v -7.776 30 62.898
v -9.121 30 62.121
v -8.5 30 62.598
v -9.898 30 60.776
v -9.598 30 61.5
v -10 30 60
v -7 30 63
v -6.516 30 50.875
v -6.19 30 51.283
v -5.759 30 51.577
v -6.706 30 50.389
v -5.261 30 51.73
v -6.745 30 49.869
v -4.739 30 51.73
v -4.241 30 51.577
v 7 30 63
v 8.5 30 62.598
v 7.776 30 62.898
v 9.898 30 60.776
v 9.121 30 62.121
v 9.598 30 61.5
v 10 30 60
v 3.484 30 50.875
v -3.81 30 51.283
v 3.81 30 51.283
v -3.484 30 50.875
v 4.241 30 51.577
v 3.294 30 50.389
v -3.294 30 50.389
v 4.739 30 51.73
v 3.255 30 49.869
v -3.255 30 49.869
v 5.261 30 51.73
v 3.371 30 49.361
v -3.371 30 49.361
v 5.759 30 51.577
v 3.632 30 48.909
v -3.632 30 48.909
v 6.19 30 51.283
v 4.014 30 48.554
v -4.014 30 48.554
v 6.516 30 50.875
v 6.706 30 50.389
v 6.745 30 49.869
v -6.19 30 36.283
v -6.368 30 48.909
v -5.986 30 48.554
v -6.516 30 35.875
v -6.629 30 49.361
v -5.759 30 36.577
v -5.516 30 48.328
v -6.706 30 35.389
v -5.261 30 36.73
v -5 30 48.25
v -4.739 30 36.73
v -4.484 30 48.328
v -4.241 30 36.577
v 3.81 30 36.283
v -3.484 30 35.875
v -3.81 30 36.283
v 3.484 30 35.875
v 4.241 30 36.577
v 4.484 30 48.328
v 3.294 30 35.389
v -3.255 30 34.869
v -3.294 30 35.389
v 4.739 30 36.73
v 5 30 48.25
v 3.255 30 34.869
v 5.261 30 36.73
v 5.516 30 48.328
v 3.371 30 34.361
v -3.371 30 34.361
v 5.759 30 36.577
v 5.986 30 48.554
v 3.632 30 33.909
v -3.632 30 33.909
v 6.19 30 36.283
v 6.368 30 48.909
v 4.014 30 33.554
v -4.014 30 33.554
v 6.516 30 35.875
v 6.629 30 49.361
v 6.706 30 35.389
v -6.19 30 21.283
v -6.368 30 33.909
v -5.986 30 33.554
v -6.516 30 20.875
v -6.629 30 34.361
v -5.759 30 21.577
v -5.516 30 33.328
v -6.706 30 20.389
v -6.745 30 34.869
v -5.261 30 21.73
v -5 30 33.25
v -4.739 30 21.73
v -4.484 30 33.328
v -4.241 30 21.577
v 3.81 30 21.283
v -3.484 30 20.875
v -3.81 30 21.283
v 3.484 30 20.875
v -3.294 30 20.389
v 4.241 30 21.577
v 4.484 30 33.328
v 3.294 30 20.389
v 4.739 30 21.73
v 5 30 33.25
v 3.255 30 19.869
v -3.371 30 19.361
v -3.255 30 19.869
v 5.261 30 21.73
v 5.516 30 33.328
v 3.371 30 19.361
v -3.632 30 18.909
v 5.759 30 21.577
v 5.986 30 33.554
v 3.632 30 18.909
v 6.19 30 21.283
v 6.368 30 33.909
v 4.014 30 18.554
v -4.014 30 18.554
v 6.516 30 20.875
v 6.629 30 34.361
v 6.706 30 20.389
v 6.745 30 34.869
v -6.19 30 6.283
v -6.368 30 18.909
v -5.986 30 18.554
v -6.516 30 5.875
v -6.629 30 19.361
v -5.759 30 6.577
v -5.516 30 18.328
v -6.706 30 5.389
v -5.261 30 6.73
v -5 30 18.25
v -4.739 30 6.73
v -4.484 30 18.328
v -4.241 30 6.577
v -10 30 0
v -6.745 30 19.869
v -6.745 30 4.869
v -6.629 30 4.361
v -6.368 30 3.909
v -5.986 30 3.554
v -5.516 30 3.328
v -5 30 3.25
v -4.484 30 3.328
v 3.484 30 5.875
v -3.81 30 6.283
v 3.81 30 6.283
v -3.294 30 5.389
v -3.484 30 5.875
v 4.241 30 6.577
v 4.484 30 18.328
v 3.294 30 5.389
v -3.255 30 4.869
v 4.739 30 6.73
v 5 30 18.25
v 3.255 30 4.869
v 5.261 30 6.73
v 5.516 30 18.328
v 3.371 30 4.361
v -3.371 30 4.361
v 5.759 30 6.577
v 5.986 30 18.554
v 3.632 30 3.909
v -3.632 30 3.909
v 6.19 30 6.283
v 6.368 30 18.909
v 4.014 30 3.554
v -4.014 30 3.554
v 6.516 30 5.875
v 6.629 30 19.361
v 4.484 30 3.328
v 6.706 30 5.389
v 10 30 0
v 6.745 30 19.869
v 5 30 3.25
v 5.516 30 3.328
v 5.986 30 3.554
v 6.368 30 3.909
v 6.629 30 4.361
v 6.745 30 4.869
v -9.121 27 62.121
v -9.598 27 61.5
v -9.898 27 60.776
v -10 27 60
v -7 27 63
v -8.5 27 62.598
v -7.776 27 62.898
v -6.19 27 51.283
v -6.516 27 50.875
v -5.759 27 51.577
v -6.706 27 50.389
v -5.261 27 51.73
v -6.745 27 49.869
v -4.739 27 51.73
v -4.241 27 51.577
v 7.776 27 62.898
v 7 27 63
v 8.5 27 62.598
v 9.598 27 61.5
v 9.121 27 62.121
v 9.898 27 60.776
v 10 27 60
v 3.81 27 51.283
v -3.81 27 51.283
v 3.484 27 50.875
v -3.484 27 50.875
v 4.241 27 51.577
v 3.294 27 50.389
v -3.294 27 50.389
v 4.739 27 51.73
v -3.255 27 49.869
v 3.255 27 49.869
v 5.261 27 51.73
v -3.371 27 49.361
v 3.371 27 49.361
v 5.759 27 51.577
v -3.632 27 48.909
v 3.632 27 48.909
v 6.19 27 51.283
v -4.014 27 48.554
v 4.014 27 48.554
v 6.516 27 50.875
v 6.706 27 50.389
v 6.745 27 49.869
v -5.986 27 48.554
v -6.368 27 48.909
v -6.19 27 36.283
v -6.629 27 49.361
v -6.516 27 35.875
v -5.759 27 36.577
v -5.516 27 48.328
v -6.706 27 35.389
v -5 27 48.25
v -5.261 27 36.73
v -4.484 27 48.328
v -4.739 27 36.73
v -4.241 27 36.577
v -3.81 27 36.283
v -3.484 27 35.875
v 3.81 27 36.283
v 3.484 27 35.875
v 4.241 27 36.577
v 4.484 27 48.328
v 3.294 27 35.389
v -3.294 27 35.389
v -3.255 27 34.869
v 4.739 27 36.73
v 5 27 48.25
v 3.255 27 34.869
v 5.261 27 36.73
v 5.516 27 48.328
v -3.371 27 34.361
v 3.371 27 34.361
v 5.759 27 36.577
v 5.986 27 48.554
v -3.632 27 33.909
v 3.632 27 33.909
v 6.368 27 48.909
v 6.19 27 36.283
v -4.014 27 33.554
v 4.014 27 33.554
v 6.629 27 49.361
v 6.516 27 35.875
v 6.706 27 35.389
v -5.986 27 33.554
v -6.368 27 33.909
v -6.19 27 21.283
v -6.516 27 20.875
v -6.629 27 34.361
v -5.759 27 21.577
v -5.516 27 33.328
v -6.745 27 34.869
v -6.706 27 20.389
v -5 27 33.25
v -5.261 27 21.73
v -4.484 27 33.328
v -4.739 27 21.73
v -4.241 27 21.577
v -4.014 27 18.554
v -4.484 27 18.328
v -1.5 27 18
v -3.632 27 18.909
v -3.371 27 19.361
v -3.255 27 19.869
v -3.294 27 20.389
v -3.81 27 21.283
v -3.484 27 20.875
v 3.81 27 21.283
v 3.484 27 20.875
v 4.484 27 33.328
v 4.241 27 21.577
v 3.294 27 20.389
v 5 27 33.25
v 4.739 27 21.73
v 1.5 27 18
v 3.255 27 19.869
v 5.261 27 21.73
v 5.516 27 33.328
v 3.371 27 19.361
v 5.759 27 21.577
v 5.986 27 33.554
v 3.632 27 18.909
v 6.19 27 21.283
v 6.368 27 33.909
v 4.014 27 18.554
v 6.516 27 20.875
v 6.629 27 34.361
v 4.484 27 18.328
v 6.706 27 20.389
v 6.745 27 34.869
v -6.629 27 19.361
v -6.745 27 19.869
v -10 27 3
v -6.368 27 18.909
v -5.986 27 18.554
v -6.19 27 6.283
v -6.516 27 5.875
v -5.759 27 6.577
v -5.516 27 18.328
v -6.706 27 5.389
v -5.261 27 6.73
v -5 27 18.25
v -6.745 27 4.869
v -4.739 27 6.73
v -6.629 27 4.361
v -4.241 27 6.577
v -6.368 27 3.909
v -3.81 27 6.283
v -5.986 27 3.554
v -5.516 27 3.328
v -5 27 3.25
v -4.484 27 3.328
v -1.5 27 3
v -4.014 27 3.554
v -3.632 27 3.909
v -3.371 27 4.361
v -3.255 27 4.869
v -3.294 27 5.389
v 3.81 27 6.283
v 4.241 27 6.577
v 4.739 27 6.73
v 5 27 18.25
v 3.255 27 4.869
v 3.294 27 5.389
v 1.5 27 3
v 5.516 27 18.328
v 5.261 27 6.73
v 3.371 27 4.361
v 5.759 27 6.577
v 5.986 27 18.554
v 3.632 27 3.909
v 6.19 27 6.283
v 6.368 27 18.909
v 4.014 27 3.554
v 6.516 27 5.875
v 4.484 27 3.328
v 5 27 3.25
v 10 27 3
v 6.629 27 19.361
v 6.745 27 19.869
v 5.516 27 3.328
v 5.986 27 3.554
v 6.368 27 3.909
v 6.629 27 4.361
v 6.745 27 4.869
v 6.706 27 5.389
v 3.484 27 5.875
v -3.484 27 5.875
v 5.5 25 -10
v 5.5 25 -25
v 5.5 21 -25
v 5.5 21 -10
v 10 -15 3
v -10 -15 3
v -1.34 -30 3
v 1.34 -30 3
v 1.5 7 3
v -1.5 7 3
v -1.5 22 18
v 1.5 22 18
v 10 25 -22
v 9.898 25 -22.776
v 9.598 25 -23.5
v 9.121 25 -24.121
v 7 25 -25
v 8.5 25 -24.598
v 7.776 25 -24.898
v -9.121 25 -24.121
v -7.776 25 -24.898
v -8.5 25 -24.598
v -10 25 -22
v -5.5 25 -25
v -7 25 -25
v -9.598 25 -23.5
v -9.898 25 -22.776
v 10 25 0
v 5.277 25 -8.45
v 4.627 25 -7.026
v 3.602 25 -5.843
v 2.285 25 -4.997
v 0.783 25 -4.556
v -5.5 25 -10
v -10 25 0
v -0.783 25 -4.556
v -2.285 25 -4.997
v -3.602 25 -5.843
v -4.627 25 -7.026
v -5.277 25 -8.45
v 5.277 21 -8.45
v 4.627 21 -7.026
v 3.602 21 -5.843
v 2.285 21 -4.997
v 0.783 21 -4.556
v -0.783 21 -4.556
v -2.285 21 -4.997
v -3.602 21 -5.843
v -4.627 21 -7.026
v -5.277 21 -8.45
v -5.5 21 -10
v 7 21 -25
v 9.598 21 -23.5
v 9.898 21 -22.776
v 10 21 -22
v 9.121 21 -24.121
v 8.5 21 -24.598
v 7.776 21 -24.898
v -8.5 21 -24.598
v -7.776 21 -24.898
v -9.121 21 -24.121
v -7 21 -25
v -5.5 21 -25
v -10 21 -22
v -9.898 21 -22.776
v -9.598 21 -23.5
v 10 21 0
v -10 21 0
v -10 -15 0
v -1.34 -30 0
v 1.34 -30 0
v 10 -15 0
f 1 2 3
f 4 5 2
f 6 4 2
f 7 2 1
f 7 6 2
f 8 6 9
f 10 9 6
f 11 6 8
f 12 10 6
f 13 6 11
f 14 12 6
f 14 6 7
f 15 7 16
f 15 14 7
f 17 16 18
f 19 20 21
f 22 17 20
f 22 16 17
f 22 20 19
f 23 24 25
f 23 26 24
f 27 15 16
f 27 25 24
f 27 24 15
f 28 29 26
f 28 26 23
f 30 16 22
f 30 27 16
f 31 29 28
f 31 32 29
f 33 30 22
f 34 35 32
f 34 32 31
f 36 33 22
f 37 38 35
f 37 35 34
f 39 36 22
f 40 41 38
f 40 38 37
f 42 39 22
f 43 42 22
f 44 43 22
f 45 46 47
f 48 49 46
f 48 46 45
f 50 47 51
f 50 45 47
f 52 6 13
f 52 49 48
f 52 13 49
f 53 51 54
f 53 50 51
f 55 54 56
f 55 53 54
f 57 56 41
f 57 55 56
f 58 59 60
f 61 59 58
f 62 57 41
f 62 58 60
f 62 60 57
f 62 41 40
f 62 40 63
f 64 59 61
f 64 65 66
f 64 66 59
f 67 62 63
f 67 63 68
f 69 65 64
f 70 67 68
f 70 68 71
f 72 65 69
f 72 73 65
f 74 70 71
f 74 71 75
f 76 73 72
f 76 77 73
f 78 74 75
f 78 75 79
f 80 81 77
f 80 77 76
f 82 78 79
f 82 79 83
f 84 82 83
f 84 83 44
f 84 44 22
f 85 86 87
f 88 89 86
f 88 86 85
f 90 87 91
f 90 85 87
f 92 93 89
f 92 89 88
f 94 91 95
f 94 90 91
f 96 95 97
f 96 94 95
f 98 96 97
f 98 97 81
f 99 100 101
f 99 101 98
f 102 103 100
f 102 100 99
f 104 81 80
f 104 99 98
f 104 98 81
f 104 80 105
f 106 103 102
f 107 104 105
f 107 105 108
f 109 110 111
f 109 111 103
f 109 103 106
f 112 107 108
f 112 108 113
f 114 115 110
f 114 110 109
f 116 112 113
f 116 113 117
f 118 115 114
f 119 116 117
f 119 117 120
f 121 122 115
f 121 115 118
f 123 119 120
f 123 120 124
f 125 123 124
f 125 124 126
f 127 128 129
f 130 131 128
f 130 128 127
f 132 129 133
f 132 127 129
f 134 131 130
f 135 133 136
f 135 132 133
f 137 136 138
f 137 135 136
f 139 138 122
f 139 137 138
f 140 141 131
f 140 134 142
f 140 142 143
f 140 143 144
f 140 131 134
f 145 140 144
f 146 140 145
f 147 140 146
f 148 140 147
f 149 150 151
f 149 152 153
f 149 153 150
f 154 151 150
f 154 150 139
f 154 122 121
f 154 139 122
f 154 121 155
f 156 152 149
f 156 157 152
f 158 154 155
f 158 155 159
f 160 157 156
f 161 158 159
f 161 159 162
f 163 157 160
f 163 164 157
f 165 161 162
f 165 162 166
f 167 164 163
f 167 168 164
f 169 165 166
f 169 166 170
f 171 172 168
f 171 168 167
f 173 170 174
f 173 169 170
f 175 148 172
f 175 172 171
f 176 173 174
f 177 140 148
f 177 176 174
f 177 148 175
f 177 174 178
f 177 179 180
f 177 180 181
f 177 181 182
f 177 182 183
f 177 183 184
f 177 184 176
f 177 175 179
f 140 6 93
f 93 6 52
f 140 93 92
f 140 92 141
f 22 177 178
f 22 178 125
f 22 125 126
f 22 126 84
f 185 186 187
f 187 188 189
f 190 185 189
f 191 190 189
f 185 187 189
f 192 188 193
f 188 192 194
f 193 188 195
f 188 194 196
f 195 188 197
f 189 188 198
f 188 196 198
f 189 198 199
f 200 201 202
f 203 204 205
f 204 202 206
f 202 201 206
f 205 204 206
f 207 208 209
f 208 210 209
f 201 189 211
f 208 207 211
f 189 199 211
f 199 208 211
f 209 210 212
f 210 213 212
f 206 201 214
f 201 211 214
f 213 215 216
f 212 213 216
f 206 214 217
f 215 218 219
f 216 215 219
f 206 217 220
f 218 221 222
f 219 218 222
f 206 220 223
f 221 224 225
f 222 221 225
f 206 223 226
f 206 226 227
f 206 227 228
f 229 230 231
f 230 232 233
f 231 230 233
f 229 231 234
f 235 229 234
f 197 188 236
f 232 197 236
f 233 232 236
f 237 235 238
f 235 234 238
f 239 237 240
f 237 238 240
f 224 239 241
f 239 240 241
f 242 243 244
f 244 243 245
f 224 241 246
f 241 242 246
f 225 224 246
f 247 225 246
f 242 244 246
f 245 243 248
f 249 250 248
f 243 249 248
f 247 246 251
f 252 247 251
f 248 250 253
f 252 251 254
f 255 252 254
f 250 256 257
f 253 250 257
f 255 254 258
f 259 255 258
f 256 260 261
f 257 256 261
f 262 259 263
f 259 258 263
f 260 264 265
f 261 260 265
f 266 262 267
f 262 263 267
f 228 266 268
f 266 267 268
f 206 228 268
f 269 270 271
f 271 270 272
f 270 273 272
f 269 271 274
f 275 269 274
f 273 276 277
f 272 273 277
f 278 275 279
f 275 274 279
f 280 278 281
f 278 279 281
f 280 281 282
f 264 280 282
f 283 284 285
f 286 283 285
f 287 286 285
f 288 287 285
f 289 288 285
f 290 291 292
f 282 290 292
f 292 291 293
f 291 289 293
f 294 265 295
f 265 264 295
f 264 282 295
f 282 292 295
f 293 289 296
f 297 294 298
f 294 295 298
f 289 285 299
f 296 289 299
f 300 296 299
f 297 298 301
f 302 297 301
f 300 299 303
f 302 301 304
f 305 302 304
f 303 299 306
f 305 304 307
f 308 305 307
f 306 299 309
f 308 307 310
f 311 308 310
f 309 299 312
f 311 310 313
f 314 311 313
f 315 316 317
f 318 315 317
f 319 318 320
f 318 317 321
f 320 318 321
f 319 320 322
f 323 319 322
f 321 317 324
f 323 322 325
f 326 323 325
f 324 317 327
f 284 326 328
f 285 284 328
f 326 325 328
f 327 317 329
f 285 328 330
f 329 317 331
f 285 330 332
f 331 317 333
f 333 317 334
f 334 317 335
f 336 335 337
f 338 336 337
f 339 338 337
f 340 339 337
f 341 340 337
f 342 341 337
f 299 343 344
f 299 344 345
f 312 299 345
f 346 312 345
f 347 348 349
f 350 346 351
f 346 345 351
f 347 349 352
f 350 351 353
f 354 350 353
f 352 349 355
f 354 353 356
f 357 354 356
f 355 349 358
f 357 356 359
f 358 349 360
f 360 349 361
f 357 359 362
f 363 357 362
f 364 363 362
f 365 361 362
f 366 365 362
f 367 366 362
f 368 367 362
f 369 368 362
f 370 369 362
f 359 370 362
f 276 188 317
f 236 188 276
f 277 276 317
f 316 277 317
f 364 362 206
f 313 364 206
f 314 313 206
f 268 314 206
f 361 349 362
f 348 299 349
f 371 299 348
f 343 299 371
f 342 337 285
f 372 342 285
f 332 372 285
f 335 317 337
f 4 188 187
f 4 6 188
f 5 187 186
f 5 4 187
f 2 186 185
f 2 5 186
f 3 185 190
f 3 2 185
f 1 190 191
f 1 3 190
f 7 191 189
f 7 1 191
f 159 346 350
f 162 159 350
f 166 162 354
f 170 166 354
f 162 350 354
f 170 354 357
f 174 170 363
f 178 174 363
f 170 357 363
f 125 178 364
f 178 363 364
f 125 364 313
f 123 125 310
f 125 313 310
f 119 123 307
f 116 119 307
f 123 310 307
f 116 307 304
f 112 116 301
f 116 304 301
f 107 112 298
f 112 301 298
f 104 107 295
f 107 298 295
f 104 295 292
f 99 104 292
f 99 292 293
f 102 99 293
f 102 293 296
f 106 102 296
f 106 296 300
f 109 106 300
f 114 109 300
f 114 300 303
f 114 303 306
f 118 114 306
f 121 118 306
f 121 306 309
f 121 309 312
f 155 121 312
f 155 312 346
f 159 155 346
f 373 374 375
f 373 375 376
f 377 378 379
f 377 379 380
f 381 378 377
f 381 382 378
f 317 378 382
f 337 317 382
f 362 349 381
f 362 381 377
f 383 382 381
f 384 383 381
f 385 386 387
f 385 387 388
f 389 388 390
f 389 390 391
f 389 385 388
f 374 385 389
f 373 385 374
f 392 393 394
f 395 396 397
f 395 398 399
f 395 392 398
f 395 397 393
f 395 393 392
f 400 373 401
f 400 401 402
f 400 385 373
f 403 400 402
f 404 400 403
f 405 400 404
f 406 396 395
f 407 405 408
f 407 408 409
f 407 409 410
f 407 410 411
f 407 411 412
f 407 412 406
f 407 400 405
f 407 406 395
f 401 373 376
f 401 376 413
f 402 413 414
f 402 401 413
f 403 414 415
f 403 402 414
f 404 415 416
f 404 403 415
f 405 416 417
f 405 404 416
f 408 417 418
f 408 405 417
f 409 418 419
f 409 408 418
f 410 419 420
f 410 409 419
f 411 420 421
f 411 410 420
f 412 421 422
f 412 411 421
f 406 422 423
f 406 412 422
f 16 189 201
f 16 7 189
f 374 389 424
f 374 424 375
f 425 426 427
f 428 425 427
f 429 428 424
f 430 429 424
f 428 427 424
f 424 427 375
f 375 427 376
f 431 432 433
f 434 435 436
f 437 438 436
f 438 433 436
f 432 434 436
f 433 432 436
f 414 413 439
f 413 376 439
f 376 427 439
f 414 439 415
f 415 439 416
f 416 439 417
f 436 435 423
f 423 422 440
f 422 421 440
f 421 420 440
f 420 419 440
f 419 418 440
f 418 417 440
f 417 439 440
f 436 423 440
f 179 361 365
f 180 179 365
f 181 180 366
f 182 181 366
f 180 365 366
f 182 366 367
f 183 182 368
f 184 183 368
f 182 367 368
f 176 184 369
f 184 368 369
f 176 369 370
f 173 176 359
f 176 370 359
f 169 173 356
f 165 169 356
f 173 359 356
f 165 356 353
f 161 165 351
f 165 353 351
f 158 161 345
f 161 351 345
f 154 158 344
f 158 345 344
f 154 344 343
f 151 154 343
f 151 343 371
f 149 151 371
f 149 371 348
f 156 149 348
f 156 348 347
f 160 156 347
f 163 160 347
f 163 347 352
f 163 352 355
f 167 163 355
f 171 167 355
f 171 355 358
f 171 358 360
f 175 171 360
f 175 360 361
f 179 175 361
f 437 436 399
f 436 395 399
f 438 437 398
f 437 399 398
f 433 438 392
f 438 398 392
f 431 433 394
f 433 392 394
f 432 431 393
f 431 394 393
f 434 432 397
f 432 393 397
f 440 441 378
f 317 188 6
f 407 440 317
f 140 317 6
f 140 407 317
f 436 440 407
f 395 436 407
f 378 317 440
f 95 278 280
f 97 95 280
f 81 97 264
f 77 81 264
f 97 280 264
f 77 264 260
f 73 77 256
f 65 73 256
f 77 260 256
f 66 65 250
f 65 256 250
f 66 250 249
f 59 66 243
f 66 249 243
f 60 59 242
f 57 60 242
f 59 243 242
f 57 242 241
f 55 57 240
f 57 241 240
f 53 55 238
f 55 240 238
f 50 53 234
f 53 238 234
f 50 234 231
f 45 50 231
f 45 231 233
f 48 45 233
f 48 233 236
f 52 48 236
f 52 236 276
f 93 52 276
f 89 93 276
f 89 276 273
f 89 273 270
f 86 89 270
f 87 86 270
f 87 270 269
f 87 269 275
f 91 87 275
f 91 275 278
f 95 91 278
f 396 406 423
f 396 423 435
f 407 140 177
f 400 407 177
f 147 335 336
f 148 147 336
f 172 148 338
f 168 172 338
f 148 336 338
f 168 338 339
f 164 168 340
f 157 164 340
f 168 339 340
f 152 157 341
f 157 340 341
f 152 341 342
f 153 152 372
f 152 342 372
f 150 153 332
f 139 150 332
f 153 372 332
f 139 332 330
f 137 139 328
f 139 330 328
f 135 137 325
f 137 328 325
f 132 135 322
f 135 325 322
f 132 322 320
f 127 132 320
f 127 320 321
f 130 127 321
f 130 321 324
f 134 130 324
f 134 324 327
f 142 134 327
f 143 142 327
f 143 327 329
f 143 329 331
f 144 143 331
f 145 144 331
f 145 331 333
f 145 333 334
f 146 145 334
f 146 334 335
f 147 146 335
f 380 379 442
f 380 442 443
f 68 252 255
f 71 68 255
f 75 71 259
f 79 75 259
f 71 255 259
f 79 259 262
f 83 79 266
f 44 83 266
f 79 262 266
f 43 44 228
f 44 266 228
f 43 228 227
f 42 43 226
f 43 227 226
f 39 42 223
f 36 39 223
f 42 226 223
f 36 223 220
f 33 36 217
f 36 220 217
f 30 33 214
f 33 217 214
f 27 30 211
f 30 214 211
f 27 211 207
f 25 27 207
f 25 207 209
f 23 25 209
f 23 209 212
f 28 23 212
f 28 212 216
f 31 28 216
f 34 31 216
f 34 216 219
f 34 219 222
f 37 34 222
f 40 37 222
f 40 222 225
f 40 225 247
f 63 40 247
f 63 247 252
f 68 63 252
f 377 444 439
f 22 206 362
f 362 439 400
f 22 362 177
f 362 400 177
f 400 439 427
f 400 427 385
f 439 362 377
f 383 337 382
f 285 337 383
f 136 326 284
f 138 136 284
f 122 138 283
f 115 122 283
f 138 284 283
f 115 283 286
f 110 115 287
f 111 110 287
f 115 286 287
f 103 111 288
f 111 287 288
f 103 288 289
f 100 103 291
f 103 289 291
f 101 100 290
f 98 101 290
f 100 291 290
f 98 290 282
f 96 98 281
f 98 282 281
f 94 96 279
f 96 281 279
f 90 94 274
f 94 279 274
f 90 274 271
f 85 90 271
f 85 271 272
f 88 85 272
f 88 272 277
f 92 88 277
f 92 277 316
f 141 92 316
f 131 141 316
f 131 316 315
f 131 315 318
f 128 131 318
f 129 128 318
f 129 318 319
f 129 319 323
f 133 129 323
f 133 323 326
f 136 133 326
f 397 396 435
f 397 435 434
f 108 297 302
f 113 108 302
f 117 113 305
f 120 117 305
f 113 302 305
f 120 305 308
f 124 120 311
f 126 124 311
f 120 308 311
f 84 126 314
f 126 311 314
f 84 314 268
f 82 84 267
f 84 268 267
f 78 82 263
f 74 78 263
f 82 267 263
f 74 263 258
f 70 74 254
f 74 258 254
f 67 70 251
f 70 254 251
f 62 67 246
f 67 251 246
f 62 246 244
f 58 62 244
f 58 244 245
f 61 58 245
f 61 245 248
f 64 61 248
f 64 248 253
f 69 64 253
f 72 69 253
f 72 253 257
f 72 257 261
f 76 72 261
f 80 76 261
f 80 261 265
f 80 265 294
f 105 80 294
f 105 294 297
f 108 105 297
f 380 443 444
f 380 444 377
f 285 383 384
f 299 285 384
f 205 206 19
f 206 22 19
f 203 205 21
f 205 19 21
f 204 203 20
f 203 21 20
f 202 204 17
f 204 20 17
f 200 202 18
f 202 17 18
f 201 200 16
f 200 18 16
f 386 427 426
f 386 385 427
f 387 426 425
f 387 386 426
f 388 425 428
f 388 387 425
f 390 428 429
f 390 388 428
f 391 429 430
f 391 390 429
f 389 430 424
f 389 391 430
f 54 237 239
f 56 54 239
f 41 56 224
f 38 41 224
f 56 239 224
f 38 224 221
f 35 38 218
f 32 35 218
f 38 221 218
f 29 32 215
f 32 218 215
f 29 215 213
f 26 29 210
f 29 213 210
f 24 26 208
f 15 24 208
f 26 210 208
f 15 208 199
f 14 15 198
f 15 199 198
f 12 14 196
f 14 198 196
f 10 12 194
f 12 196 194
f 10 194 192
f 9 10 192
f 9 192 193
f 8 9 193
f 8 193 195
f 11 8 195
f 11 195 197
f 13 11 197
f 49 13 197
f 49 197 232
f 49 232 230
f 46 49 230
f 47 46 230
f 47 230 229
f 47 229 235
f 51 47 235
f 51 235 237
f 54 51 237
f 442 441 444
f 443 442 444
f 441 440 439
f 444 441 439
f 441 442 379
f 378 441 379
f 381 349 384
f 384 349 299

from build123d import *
from OCP.BRepFilletAPI import BRepFilletAPI_MakeChamfer

# Parameters (mm, degrees)
SKETCH1_W           = 20
SKETCH1_H           = 60
BOSS_EXTRUDE1_DEPTH = 3
SKETCH2_W           = 20
SKETCH2_H           = 3
BOSS_EXTRUDE2_DEPTH = 60
SKETCH3_W           = 3
SKETCH3_H           = 15
BOSS_EXTRUDE3_DEPTH = 20
CHAMFER1_SIZE       = 15
SKETCH4_R           = 1.75
CUT_EXTRUDE1_DEPTH  = 86.545309632
LPATTERN1_COUNT     = 4
LPATTERN1_PITCH     = 15
CHAMFER2_SIZE       = 15
CHAMFER2_SIZE2      = 8.660254038
FILLET1_R           = 3
SKETCH5_W           = 20
SKETCH5_H           = 4
BOSS_EXTRUDE4_DEPTH = 25
CUT_EXTRUDE2_DEPTH  = 85.225886757
FILLET2_R           = 3


with BuildPart() as part:
    # Sketch1 → Boss-Extrude1 (new body)
    with BuildSketch(Plane.XY):
        Rectangle(SKETCH1_W, SKETCH1_H)
    extrude(amount=BOSS_EXTRUDE1_DEPTH)

    # Sketch2 → Boss-Extrude2 (add)
    with BuildSketch(Plane.XY.offset(3)):
        with Locations((0, 28.5)):
            Rectangle(SKETCH2_W, SKETCH2_H)
    extrude(amount=BOSS_EXTRUDE2_DEPTH)

    # Sketch3 → Boss-Extrude3 (add)
    with BuildSketch(Plane.XZ.offset(-27)):
        with Locations((0, 10.5)):
            Rectangle(SKETCH3_W, SKETCH3_H)
    extrude(amount=BOSS_EXTRUDE3_DEPTH)

    # Chamfer1
    chamfer1_edges = [part.edges().sort_by_distance(p)[0] for p in [
        (0, 7, 18),
    ]]
    chamfer(chamfer1_edges, length=CHAMFER1_SIZE - 0.0001)  # a hair under: the kernel refuses the full size

    # Sketch4 → Cut-Extrude1 (cut, through all)
    with BuildSketch(Plane.XZ.offset(-27)):
        with Locations(Location((-5, 5, 0), (0, 0, 270))):
            Circle(SKETCH4_R)
        with Locations(Location((5, 5, 0), (0, 0, 270))):
            Circle(SKETCH4_R)
    cut_extrude1 = extrude(amount=-CUT_EXTRUDE1_DEPTH, mode=Mode.SUBTRACT)

    # LPattern1: Cut-Extrude1 ×4
    with Locations(*[(0, 0, i * LPATTERN1_PITCH) for i in range(1, LPATTERN1_COUNT)]):
        add(cut_extrude1, mode=Mode.SUBTRACT)

    # Chamfer2: one chamfer whose edges measure the first distance from different faces: ONE call of the kernel's chamfer builder (chamfer() names one face for all edges)
    chamfer2_edges_1 = [part.edges().sort_by_distance(p)[0] for p in [
        (10, -30, 1.5),
    ]]
    chamfer2_side_1 = [part.faces().sort_by_distance(p)[0] for p in [
        (10, 29.13, 31.5),
    ]]
    chamfer2_edges_2 = [part.edges().sort_by_distance(p)[0] for p in [
        (-10, -30, 1.5),
    ]]
    chamfer2_side_2 = [part.faces().sort_by_distance(p)[0] for p in [
        (-10, -29.13, 1.5),
    ]]
    chamfer2 = BRepFilletAPI_MakeChamfer(part.part.solid().wrapped)
    for e in chamfer2_edges_1:
        chamfer2.Add(CHAMFER2_SIZE, CHAMFER2_SIZE2, e.wrapped, chamfer2_side_1[0].wrapped)  # the first distance lies on this face
    for e in chamfer2_edges_2:
        chamfer2.Add(CHAMFER2_SIZE, CHAMFER2_SIZE2, e.wrapped, chamfer2_side_2[0].wrapped)  # the first distance lies on this face
    add(Compound.cast(chamfer2.Shape()), mode=Mode.REPLACE)

    # Fillet1
    fillet1_edges = [part.edges().sort_by_distance(p)[0] for p in [
        (-10, 28.5, 63),
        (10, 28.5, 63),
    ]]
    fillet(fillet1_edges, radius=FILLET1_R)

    # Sketch5 → Boss-Extrude4 (add)
    with BuildSketch(Plane(origin=(0, 0, 0), x_dir=(-1, 0, 0), z_dir=(0, 0, -1))):
        with Locations((0, 23)):
            Rectangle(SKETCH5_W, SKETCH5_H)
    extrude(amount=BOSS_EXTRUDE4_DEPTH)

    # Sketch6 → Cut-Extrude2 (cut, through all)
    with BuildSketch(Plane(origin=(0, 25, 0), x_dir=(1, 0, 0), z_dir=(0, 1, 0))):
        with BuildLine():
            Line((-5.5, 10), (-5.5, 25))
            Line((-5.5, 25), (5.5, 25))
            Line((5.5, 25), (5.5, 10))
            ThreePointArc((5.5, 10), (0, 4.5), (-5.5, 10))
        make_face()
    extrude(amount=-CUT_EXTRUDE2_DEPTH, mode=Mode.SUBTRACT)

    # Fillet2
    fillet2_edges = [part.edges().sort_by_distance(p)[0] for p in [
        (10, 23, -25),
        (-10, 23, -25),
    ]]
    fillet(fillet2_edges, radius=FILLET2_R)


solid = part.part
